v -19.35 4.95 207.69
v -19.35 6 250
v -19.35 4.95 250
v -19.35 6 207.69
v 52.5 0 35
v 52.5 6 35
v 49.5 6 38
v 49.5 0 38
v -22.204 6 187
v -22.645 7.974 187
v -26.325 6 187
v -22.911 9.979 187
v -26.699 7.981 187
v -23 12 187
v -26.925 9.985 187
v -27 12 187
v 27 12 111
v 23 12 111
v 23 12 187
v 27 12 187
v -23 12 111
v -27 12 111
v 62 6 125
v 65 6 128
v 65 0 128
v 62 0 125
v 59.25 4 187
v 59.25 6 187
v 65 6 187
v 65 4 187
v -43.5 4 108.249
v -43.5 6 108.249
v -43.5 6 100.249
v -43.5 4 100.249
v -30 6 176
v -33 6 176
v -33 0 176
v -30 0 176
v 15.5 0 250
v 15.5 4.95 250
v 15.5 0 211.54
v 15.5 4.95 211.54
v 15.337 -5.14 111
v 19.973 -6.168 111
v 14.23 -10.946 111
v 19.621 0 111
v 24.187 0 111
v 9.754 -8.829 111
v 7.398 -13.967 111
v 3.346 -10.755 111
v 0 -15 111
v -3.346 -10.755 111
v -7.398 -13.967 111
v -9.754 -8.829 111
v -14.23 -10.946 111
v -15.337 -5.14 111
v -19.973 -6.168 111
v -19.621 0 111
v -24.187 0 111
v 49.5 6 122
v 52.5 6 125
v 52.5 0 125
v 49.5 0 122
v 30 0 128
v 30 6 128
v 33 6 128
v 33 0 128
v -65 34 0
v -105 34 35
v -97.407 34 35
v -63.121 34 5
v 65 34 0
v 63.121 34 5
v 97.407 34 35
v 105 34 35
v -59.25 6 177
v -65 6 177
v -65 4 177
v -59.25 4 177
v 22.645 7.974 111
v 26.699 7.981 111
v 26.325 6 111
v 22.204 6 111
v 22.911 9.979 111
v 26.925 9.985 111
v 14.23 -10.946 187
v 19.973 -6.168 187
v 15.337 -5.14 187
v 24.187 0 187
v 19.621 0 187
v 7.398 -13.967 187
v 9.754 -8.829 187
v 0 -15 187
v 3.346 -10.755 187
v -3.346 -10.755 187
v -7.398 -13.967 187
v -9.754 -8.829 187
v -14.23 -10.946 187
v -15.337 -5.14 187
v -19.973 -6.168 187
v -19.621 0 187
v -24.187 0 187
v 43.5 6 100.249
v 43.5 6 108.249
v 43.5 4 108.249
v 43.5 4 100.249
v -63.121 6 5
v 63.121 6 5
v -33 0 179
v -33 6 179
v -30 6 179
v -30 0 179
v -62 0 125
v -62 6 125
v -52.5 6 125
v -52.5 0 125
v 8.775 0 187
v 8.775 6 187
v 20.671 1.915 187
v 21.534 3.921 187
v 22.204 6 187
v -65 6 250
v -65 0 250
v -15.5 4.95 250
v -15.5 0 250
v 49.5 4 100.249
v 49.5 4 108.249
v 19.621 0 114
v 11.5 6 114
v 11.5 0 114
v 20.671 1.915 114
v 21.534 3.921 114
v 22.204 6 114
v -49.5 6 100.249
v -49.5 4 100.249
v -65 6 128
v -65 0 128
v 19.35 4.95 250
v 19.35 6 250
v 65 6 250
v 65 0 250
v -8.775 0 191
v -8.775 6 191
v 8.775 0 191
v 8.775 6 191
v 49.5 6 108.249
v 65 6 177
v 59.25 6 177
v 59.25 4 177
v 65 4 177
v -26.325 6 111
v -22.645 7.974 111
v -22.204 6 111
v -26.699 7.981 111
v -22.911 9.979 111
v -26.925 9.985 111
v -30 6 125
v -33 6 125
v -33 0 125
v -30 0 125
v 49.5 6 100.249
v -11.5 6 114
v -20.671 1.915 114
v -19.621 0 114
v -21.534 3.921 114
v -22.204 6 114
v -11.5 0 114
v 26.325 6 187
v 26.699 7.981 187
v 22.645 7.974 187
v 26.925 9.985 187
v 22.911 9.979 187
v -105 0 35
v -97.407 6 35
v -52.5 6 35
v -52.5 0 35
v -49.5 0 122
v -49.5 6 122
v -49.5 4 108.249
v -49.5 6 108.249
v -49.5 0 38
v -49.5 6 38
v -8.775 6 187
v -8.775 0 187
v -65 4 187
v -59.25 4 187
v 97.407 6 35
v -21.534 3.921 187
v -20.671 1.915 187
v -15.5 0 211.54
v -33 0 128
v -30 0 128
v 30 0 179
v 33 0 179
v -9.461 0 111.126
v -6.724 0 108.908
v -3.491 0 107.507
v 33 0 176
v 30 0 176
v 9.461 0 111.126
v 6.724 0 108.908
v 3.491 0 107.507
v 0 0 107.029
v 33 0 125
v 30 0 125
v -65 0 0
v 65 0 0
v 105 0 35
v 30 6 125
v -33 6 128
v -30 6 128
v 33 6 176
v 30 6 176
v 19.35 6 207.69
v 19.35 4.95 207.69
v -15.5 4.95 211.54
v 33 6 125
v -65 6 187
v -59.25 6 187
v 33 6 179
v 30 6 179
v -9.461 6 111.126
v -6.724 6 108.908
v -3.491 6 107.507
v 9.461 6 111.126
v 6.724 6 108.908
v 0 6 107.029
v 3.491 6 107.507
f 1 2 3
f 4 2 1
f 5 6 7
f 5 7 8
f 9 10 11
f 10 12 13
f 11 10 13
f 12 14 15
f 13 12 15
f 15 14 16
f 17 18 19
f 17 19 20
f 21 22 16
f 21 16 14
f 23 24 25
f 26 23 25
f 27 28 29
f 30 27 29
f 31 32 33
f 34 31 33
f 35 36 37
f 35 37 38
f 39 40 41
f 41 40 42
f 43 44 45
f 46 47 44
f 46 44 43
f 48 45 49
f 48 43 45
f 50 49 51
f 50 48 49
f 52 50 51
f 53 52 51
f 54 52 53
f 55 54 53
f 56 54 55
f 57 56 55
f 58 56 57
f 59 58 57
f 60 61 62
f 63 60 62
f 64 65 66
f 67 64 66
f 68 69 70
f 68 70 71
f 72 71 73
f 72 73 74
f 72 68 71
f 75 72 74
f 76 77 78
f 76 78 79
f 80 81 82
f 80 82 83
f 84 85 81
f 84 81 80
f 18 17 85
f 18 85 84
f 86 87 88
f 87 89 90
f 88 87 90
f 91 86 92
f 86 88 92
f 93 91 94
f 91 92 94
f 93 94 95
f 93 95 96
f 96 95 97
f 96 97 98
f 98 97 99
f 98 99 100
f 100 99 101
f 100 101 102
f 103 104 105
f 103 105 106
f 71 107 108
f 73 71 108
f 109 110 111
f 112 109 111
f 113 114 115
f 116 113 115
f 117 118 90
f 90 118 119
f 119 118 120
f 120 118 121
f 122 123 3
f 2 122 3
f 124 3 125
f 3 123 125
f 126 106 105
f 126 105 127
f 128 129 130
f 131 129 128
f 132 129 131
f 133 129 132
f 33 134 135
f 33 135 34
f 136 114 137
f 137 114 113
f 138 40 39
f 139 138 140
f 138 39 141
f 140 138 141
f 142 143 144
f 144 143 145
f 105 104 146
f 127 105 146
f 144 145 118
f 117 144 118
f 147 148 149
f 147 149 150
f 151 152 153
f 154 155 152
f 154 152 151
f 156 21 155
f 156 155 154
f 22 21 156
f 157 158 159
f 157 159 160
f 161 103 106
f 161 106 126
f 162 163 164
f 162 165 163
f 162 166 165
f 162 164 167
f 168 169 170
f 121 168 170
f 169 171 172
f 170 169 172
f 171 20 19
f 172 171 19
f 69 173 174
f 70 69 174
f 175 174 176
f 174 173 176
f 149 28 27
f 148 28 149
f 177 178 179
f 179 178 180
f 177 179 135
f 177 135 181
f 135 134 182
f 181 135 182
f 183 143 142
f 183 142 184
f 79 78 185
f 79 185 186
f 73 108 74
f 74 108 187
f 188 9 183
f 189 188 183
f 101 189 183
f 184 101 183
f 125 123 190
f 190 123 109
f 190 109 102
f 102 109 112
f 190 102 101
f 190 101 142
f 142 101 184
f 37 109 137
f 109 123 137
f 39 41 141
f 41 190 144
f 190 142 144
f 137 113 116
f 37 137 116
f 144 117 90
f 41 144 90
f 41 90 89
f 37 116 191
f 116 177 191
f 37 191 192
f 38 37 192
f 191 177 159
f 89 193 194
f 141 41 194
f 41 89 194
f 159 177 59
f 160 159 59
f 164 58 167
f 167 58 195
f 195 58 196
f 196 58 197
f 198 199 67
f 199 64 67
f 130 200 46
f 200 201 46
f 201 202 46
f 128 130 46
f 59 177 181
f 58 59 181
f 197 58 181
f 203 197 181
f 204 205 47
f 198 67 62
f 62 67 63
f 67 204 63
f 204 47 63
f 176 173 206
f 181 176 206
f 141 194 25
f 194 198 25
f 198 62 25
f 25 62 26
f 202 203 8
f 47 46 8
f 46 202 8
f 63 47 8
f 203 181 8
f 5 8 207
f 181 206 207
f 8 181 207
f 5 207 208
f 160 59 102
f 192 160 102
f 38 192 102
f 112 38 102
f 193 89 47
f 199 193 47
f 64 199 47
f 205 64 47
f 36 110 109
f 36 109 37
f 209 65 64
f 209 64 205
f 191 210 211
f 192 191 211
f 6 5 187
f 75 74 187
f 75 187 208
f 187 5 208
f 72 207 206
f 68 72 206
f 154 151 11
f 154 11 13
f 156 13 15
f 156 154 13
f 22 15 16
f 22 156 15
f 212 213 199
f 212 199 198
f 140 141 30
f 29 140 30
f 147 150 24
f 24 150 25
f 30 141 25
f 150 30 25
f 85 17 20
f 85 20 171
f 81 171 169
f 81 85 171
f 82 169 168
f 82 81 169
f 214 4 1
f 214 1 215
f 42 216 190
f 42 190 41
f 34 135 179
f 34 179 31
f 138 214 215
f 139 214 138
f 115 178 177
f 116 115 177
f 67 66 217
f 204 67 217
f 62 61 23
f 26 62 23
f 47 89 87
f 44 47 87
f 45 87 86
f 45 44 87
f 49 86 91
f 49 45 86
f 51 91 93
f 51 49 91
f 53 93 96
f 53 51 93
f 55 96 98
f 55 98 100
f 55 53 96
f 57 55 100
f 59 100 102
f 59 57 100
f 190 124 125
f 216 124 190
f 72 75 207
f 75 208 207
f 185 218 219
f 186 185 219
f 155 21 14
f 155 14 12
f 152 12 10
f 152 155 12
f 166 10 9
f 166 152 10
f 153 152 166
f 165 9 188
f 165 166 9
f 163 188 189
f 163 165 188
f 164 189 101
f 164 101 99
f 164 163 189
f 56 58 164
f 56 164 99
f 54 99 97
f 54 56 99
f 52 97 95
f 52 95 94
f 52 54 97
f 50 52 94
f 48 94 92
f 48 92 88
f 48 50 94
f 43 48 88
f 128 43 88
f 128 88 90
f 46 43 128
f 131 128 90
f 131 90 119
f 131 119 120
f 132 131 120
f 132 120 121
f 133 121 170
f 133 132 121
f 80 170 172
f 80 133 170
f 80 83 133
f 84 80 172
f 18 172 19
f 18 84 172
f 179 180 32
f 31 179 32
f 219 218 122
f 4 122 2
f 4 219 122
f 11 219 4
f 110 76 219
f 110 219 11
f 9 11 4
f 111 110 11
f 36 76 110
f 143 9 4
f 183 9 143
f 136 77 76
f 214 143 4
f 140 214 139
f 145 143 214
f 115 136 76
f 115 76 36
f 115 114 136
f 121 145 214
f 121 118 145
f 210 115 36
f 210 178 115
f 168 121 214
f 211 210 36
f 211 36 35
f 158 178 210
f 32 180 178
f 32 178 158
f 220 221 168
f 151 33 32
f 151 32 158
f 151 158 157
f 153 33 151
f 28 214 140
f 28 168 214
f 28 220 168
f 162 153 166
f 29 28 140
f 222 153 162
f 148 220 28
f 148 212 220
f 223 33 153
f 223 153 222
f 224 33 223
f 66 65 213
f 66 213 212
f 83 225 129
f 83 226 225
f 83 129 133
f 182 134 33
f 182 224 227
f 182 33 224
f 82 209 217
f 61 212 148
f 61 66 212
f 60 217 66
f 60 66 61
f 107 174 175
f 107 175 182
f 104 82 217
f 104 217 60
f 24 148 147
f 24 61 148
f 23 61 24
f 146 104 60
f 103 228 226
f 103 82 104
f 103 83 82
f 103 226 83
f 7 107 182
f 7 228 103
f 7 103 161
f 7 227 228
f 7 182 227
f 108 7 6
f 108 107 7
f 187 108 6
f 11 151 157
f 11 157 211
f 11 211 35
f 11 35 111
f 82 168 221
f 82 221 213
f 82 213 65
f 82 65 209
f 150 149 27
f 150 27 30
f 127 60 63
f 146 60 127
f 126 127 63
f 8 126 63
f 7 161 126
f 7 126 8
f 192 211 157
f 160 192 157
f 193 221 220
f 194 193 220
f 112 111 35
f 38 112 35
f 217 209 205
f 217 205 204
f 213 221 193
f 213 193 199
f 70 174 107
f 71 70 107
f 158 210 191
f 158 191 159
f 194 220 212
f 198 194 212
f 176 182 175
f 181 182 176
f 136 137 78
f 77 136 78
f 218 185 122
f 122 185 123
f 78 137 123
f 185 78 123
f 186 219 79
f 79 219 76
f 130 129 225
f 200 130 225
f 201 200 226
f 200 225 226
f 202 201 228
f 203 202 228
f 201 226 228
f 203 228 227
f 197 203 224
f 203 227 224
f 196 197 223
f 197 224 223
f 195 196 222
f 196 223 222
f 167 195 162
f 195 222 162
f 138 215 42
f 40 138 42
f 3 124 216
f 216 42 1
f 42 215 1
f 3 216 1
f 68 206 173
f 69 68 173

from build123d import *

# Parameters (mm, degrees)
BOSS_EXTRUDE1_DEPTH      = 6
BOSS_EXTRUDE2_DEPTH      = 28
SKETCH5_W                = 15.5
SKETCH5_H                = 90
CUT_EXTRUDE2_DEPTH       = 273.596771808
CHAMFER2_SIZE            = 3
SKETCH8_W                = 46
SKETCH8_H                = 73
CUT_EXTRUDE4_DEPTH       = 23
BOSS_EXTRUDE5_DEPTH      = 73
BOSS_EXTRUDE5_DEPTH_BACK = 3
BOSS_EXTRUDE5_START      = 114
BOSS_EXTRUDE6_DEPTH      = 18.95
SKETCH11_W               = 31
SKETCH11_H               = 38.46
CUT_EXTRUDE5_DEPTH       = 19.03
CUT_EXTRUDE7_START       = 18.95
CUT_EXTRUDE7_DEPTH       = 20
CUT_EXTRUDE8_REACH       = 274.597
CUT_EXTRUDE9_REACH       = 274.597
SKETCH13_W               = 17.55
SKETCH13_H               = 4
CUT_EXTRUDE10_REACH      = 274.597
SKETCH14_W               = 3
SKETCH14_H               = 3
SKETCH15_W               = 6
SKETCH15_H               = 8
SKETCH15_W_2             = 5.75
SKETCH15_H_2             = 10
CUT_EXTRUDE11_DEPTH      = 2


with BuildPart() as part:
    # Sketch1 → Boss-Extrude1 (new body)
    with BuildSketch(Plane(origin=(0, 0, 0), x_dir=(1, 0, 0), z_dir=(0, 1, 0))):
        Polygon((105, -35), (65, 0), (0, 0), (0, -250), (65, -250), (65, -35), align=None)
        Polygon((0, -250), (0, 0), (-65, 0), (-105, -35), (-65, -35), (-65, -250), align=None)
    extrude(amount=BOSS_EXTRUDE1_DEPTH)

    # Sketch2 → Boss-Extrude2 (add)
    with BuildSketch(Plane(origin=(0, 6, 0), x_dir=(1, 0, 0), z_dir=(0, 1, 0))):
        Polygon((-105, -35), (-97.407038705, -35), (-63.121324419, -5), (63.121324419, -5), (97.407038705, -35), (105, -35), (65, 0), (-65, 0), align=None)
    extrude(amount=BOSS_EXTRUDE2_DEPTH)

    # Sketch5 → Cut-Extrude2 (cut, through all)
    with BuildSketch(Plane(origin=(0, 6, 0), x_dir=(1, 0, 0), z_dir=(0, 1, 0))):
        with Locations((-57.25, -80)):
            Rectangle(SKETCH5_W, SKETCH5_H)
        with Locations((57.25, -80)):
            Rectangle(SKETCH5_W, SKETCH5_H)
    extrude(amount=-CUT_EXTRUDE2_DEPTH, mode=Mode.SUBTRACT)

    # Chamfer2
    chamfer2_edges = [part.edges().sort_by_distance(p)[0] for p in [
        (-65, 3, 125),
        (-49.5, 3, 35),
        (-49.5, 3, 125),
        (65, 3, 125),
        (49.5, 3, 125),
        (49.5, 3, 35),
    ]]
    chamfer(chamfer2_edges, length=CHAMFER2_SIZE)

    # Sketch8 → Cut-Extrude4 (cut)
    with BuildSketch(Plane(origin=(0, 6, 0), x_dir=(1, 0, 0), z_dir=(0, 1, 0))):
        with Locations((0, -150.5)):
            Rectangle(SKETCH8_W, SKETCH8_H)
    extrude(amount=-CUT_EXTRUDE4_DEPTH, mode=Mode.SUBTRACT)

    # Sketch9 → Boss-Extrude5 (add, two sides: drawn at the far end of the back side and taken through both)
    with BuildSketch(Plane.XY.offset(BOSS_EXTRUDE5_START - BOSS_EXTRUDE5_DEPTH_BACK)):
        with BuildLine():
            Line((-27, 12), (-23, 12))
            ThreePointArc((-23, 12), (0, -11), (23, 12))
            Line((23, 12), (27, 12))
            ThreePointArc((27, 12), (0, -15), (-27, 12))
        make_face()
    extrude(amount=BOSS_EXTRUDE5_DEPTH + BOSS_EXTRUDE5_DEPTH_BACK)

    # Sketch10 → Boss-Extrude6 (add)
    with BuildSketch(Plane(origin=(0, 6, 0), x_dir=(1, 0, 0), z_dir=(0, 1, 0))):
        Polygon((-19.35, -250), (-19.35, -207.69), (19.35, -207.69), (19.35, -250), (15.5, -250), (15.5, -211.54), (-15.5, -211.54), (-15.5, -250), align=None)
    extrude(amount=BOSS_EXTRUDE6_DEPTH)

    # Sketch11 → Cut-Extrude5 (cut)
    with BuildSketch(Plane(origin=(0, 6, 0), x_dir=(1, 0, 0), z_dir=(0, 1, 0))):
        with Locations((0, -230.77)):
            Rectangle(SKETCH11_W, SKETCH11_H)
    extrude(amount=-CUT_EXTRUDE5_DEPTH, mode=Mode.SUBTRACT)

    # Sketch10<3> → Cut-Extrude7 (cut)
    with BuildSketch(Plane(origin=(0, 6, 0), x_dir=(1, 0, 0), z_dir=(0, 1, 0)).offset(CUT_EXTRUDE7_START)):
        Polygon((-19.35, -250), (-19.35, -207.69), (19.35, -207.69), (19.35, -250), (15.5, -250), (15.5, -211.54), (-15.5, -211.54), (-15.5, -250), align=None)
    extrude(amount=-CUT_EXTRUDE7_DEPTH, mode=Mode.SUBTRACT)

    # Sketch12 → Cut-Extrude8 (cut, up to next)
    with BuildSketch(Plane(origin=(0, 6, 0), x_dir=(1, 0, 0), z_dir=(0, 1, 0)), mode=Mode.PRIVATE) as cut_extrude8_sk1:
        with BuildLine():
            Line((-11.5, -114), (11.5, -114))
            ThreePointArc((11.5, -114), (0, -107.028878229), (-11.5, -114))
        make_face()
    cut_extrude8_tool1 = extrude(cut_extrude8_sk1.sketch, amount=-CUT_EXTRUDE8_REACH, mode=Mode.PRIVATE) & part.part
    add(cut_extrude8_tool1.solids().sort_by_distance((0, 6, 111.135325))[0], mode=Mode.SUBTRACT)

    # Sketch13 → Cut-Extrude9 (cut, up to next)
    with BuildSketch(Plane(origin=(0, 6, 0), x_dir=(1, 0, 0), z_dir=(0, 1, 0)), mode=Mode.PRIVATE) as cut_extrude9_sk1:
        with Locations((0, -189)):
            Rectangle(SKETCH13_W, SKETCH13_H)
    cut_extrude9_tool1 = extrude(cut_extrude9_sk1.sketch, amount=-CUT_EXTRUDE9_REACH, mode=Mode.PRIVATE) & part.part
    add(cut_extrude9_tool1.solids().sort_by_distance((0, 6, 189))[0], mode=Mode.SUBTRACT)

    # Sketch14 → Cut-Extrude10 (cut, up to next)
    with BuildSketch(Plane(origin=(0, 6, 0), x_dir=(1, 0, 0), z_dir=(0, 1, 0)), mode=Mode.PRIVATE) as cut_extrude10_sk1:
        with Locations((-31.5, -126.5)):
            Rectangle(SKETCH14_W, SKETCH14_H)
    cut_extrude10_tool1 = extrude(cut_extrude10_sk1.sketch, amount=-CUT_EXTRUDE10_REACH, mode=Mode.PRIVATE) & part.part
    # Sketch14 → Cut-Extrude10 (cut, up to next)
    with BuildSketch(Plane(origin=(0, 6, 0), x_dir=(1, 0, 0), z_dir=(0, 1, 0)), mode=Mode.PRIVATE) as cut_extrude10_sk2:
        with Locations((-31.5, -177.5)):
            Rectangle(SKETCH14_W, SKETCH14_H)
    cut_extrude10_tool2 = extrude(cut_extrude10_sk2.sketch, amount=-CUT_EXTRUDE10_REACH, mode=Mode.PRIVATE) & part.part
    # Sketch14 → Cut-Extrude10 (cut, up to next)
    with BuildSketch(Plane(origin=(0, 6, 0), x_dir=(1, 0, 0), z_dir=(0, 1, 0)), mode=Mode.PRIVATE) as cut_extrude10_sk3:
        with Locations((31.5, -126.5)):
            Rectangle(SKETCH14_W, SKETCH14_H)
    cut_extrude10_tool3 = extrude(cut_extrude10_sk3.sketch, amount=-CUT_EXTRUDE10_REACH, mode=Mode.PRIVATE) & part.part
    # Sketch14 → Cut-Extrude10 (cut, up to next)
    with BuildSketch(Plane(origin=(0, 6, 0), x_dir=(1, 0, 0), z_dir=(0, 1, 0)), mode=Mode.PRIVATE) as cut_extrude10_sk4:
        with Locations((31.5, -177.5)):
            Rectangle(SKETCH14_W, SKETCH14_H)
    cut_extrude10_tool4 = extrude(cut_extrude10_sk4.sketch, amount=-CUT_EXTRUDE10_REACH, mode=Mode.PRIVATE) & part.part
    add(cut_extrude10_tool1.solids().sort_by_distance((-31.5, 6, 126.5))[0], mode=Mode.SUBTRACT)
    add(cut_extrude10_tool2.solids().sort_by_distance((-31.5, 6, 177.5))[0], mode=Mode.SUBTRACT)
    add(cut_extrude10_tool3.solids().sort_by_distance((31.5, 6, 126.5))[0], mode=Mode.SUBTRACT)
    add(cut_extrude10_tool4.solids().sort_by_distance((31.5, 6, 177.5))[0], mode=Mode.SUBTRACT)

    # Sketch15 → Cut-Extrude11 (cut)
    with BuildSketch(Plane(origin=(0, 6, 0), x_dir=(1, 0, 0), z_dir=(0, 1, 0))):
        with Locations((-46.5, -104.24941096)):
            Rectangle(SKETCH15_W, SKETCH15_H)
        with Locations((-62.125, -182)):
            Rectangle(SKETCH15_W_2, SKETCH15_H_2)
        with Locations((62.125, -182)):
            Rectangle(SKETCH15_W_2, SKETCH15_H_2)
        with Locations((46.5, -104.24941096)):
            Rectangle(SKETCH15_W, SKETCH15_H)
    extrude(amount=-CUT_EXTRUDE11_DEPTH, mode=Mode.SUBTRACT)


solid = part.part
